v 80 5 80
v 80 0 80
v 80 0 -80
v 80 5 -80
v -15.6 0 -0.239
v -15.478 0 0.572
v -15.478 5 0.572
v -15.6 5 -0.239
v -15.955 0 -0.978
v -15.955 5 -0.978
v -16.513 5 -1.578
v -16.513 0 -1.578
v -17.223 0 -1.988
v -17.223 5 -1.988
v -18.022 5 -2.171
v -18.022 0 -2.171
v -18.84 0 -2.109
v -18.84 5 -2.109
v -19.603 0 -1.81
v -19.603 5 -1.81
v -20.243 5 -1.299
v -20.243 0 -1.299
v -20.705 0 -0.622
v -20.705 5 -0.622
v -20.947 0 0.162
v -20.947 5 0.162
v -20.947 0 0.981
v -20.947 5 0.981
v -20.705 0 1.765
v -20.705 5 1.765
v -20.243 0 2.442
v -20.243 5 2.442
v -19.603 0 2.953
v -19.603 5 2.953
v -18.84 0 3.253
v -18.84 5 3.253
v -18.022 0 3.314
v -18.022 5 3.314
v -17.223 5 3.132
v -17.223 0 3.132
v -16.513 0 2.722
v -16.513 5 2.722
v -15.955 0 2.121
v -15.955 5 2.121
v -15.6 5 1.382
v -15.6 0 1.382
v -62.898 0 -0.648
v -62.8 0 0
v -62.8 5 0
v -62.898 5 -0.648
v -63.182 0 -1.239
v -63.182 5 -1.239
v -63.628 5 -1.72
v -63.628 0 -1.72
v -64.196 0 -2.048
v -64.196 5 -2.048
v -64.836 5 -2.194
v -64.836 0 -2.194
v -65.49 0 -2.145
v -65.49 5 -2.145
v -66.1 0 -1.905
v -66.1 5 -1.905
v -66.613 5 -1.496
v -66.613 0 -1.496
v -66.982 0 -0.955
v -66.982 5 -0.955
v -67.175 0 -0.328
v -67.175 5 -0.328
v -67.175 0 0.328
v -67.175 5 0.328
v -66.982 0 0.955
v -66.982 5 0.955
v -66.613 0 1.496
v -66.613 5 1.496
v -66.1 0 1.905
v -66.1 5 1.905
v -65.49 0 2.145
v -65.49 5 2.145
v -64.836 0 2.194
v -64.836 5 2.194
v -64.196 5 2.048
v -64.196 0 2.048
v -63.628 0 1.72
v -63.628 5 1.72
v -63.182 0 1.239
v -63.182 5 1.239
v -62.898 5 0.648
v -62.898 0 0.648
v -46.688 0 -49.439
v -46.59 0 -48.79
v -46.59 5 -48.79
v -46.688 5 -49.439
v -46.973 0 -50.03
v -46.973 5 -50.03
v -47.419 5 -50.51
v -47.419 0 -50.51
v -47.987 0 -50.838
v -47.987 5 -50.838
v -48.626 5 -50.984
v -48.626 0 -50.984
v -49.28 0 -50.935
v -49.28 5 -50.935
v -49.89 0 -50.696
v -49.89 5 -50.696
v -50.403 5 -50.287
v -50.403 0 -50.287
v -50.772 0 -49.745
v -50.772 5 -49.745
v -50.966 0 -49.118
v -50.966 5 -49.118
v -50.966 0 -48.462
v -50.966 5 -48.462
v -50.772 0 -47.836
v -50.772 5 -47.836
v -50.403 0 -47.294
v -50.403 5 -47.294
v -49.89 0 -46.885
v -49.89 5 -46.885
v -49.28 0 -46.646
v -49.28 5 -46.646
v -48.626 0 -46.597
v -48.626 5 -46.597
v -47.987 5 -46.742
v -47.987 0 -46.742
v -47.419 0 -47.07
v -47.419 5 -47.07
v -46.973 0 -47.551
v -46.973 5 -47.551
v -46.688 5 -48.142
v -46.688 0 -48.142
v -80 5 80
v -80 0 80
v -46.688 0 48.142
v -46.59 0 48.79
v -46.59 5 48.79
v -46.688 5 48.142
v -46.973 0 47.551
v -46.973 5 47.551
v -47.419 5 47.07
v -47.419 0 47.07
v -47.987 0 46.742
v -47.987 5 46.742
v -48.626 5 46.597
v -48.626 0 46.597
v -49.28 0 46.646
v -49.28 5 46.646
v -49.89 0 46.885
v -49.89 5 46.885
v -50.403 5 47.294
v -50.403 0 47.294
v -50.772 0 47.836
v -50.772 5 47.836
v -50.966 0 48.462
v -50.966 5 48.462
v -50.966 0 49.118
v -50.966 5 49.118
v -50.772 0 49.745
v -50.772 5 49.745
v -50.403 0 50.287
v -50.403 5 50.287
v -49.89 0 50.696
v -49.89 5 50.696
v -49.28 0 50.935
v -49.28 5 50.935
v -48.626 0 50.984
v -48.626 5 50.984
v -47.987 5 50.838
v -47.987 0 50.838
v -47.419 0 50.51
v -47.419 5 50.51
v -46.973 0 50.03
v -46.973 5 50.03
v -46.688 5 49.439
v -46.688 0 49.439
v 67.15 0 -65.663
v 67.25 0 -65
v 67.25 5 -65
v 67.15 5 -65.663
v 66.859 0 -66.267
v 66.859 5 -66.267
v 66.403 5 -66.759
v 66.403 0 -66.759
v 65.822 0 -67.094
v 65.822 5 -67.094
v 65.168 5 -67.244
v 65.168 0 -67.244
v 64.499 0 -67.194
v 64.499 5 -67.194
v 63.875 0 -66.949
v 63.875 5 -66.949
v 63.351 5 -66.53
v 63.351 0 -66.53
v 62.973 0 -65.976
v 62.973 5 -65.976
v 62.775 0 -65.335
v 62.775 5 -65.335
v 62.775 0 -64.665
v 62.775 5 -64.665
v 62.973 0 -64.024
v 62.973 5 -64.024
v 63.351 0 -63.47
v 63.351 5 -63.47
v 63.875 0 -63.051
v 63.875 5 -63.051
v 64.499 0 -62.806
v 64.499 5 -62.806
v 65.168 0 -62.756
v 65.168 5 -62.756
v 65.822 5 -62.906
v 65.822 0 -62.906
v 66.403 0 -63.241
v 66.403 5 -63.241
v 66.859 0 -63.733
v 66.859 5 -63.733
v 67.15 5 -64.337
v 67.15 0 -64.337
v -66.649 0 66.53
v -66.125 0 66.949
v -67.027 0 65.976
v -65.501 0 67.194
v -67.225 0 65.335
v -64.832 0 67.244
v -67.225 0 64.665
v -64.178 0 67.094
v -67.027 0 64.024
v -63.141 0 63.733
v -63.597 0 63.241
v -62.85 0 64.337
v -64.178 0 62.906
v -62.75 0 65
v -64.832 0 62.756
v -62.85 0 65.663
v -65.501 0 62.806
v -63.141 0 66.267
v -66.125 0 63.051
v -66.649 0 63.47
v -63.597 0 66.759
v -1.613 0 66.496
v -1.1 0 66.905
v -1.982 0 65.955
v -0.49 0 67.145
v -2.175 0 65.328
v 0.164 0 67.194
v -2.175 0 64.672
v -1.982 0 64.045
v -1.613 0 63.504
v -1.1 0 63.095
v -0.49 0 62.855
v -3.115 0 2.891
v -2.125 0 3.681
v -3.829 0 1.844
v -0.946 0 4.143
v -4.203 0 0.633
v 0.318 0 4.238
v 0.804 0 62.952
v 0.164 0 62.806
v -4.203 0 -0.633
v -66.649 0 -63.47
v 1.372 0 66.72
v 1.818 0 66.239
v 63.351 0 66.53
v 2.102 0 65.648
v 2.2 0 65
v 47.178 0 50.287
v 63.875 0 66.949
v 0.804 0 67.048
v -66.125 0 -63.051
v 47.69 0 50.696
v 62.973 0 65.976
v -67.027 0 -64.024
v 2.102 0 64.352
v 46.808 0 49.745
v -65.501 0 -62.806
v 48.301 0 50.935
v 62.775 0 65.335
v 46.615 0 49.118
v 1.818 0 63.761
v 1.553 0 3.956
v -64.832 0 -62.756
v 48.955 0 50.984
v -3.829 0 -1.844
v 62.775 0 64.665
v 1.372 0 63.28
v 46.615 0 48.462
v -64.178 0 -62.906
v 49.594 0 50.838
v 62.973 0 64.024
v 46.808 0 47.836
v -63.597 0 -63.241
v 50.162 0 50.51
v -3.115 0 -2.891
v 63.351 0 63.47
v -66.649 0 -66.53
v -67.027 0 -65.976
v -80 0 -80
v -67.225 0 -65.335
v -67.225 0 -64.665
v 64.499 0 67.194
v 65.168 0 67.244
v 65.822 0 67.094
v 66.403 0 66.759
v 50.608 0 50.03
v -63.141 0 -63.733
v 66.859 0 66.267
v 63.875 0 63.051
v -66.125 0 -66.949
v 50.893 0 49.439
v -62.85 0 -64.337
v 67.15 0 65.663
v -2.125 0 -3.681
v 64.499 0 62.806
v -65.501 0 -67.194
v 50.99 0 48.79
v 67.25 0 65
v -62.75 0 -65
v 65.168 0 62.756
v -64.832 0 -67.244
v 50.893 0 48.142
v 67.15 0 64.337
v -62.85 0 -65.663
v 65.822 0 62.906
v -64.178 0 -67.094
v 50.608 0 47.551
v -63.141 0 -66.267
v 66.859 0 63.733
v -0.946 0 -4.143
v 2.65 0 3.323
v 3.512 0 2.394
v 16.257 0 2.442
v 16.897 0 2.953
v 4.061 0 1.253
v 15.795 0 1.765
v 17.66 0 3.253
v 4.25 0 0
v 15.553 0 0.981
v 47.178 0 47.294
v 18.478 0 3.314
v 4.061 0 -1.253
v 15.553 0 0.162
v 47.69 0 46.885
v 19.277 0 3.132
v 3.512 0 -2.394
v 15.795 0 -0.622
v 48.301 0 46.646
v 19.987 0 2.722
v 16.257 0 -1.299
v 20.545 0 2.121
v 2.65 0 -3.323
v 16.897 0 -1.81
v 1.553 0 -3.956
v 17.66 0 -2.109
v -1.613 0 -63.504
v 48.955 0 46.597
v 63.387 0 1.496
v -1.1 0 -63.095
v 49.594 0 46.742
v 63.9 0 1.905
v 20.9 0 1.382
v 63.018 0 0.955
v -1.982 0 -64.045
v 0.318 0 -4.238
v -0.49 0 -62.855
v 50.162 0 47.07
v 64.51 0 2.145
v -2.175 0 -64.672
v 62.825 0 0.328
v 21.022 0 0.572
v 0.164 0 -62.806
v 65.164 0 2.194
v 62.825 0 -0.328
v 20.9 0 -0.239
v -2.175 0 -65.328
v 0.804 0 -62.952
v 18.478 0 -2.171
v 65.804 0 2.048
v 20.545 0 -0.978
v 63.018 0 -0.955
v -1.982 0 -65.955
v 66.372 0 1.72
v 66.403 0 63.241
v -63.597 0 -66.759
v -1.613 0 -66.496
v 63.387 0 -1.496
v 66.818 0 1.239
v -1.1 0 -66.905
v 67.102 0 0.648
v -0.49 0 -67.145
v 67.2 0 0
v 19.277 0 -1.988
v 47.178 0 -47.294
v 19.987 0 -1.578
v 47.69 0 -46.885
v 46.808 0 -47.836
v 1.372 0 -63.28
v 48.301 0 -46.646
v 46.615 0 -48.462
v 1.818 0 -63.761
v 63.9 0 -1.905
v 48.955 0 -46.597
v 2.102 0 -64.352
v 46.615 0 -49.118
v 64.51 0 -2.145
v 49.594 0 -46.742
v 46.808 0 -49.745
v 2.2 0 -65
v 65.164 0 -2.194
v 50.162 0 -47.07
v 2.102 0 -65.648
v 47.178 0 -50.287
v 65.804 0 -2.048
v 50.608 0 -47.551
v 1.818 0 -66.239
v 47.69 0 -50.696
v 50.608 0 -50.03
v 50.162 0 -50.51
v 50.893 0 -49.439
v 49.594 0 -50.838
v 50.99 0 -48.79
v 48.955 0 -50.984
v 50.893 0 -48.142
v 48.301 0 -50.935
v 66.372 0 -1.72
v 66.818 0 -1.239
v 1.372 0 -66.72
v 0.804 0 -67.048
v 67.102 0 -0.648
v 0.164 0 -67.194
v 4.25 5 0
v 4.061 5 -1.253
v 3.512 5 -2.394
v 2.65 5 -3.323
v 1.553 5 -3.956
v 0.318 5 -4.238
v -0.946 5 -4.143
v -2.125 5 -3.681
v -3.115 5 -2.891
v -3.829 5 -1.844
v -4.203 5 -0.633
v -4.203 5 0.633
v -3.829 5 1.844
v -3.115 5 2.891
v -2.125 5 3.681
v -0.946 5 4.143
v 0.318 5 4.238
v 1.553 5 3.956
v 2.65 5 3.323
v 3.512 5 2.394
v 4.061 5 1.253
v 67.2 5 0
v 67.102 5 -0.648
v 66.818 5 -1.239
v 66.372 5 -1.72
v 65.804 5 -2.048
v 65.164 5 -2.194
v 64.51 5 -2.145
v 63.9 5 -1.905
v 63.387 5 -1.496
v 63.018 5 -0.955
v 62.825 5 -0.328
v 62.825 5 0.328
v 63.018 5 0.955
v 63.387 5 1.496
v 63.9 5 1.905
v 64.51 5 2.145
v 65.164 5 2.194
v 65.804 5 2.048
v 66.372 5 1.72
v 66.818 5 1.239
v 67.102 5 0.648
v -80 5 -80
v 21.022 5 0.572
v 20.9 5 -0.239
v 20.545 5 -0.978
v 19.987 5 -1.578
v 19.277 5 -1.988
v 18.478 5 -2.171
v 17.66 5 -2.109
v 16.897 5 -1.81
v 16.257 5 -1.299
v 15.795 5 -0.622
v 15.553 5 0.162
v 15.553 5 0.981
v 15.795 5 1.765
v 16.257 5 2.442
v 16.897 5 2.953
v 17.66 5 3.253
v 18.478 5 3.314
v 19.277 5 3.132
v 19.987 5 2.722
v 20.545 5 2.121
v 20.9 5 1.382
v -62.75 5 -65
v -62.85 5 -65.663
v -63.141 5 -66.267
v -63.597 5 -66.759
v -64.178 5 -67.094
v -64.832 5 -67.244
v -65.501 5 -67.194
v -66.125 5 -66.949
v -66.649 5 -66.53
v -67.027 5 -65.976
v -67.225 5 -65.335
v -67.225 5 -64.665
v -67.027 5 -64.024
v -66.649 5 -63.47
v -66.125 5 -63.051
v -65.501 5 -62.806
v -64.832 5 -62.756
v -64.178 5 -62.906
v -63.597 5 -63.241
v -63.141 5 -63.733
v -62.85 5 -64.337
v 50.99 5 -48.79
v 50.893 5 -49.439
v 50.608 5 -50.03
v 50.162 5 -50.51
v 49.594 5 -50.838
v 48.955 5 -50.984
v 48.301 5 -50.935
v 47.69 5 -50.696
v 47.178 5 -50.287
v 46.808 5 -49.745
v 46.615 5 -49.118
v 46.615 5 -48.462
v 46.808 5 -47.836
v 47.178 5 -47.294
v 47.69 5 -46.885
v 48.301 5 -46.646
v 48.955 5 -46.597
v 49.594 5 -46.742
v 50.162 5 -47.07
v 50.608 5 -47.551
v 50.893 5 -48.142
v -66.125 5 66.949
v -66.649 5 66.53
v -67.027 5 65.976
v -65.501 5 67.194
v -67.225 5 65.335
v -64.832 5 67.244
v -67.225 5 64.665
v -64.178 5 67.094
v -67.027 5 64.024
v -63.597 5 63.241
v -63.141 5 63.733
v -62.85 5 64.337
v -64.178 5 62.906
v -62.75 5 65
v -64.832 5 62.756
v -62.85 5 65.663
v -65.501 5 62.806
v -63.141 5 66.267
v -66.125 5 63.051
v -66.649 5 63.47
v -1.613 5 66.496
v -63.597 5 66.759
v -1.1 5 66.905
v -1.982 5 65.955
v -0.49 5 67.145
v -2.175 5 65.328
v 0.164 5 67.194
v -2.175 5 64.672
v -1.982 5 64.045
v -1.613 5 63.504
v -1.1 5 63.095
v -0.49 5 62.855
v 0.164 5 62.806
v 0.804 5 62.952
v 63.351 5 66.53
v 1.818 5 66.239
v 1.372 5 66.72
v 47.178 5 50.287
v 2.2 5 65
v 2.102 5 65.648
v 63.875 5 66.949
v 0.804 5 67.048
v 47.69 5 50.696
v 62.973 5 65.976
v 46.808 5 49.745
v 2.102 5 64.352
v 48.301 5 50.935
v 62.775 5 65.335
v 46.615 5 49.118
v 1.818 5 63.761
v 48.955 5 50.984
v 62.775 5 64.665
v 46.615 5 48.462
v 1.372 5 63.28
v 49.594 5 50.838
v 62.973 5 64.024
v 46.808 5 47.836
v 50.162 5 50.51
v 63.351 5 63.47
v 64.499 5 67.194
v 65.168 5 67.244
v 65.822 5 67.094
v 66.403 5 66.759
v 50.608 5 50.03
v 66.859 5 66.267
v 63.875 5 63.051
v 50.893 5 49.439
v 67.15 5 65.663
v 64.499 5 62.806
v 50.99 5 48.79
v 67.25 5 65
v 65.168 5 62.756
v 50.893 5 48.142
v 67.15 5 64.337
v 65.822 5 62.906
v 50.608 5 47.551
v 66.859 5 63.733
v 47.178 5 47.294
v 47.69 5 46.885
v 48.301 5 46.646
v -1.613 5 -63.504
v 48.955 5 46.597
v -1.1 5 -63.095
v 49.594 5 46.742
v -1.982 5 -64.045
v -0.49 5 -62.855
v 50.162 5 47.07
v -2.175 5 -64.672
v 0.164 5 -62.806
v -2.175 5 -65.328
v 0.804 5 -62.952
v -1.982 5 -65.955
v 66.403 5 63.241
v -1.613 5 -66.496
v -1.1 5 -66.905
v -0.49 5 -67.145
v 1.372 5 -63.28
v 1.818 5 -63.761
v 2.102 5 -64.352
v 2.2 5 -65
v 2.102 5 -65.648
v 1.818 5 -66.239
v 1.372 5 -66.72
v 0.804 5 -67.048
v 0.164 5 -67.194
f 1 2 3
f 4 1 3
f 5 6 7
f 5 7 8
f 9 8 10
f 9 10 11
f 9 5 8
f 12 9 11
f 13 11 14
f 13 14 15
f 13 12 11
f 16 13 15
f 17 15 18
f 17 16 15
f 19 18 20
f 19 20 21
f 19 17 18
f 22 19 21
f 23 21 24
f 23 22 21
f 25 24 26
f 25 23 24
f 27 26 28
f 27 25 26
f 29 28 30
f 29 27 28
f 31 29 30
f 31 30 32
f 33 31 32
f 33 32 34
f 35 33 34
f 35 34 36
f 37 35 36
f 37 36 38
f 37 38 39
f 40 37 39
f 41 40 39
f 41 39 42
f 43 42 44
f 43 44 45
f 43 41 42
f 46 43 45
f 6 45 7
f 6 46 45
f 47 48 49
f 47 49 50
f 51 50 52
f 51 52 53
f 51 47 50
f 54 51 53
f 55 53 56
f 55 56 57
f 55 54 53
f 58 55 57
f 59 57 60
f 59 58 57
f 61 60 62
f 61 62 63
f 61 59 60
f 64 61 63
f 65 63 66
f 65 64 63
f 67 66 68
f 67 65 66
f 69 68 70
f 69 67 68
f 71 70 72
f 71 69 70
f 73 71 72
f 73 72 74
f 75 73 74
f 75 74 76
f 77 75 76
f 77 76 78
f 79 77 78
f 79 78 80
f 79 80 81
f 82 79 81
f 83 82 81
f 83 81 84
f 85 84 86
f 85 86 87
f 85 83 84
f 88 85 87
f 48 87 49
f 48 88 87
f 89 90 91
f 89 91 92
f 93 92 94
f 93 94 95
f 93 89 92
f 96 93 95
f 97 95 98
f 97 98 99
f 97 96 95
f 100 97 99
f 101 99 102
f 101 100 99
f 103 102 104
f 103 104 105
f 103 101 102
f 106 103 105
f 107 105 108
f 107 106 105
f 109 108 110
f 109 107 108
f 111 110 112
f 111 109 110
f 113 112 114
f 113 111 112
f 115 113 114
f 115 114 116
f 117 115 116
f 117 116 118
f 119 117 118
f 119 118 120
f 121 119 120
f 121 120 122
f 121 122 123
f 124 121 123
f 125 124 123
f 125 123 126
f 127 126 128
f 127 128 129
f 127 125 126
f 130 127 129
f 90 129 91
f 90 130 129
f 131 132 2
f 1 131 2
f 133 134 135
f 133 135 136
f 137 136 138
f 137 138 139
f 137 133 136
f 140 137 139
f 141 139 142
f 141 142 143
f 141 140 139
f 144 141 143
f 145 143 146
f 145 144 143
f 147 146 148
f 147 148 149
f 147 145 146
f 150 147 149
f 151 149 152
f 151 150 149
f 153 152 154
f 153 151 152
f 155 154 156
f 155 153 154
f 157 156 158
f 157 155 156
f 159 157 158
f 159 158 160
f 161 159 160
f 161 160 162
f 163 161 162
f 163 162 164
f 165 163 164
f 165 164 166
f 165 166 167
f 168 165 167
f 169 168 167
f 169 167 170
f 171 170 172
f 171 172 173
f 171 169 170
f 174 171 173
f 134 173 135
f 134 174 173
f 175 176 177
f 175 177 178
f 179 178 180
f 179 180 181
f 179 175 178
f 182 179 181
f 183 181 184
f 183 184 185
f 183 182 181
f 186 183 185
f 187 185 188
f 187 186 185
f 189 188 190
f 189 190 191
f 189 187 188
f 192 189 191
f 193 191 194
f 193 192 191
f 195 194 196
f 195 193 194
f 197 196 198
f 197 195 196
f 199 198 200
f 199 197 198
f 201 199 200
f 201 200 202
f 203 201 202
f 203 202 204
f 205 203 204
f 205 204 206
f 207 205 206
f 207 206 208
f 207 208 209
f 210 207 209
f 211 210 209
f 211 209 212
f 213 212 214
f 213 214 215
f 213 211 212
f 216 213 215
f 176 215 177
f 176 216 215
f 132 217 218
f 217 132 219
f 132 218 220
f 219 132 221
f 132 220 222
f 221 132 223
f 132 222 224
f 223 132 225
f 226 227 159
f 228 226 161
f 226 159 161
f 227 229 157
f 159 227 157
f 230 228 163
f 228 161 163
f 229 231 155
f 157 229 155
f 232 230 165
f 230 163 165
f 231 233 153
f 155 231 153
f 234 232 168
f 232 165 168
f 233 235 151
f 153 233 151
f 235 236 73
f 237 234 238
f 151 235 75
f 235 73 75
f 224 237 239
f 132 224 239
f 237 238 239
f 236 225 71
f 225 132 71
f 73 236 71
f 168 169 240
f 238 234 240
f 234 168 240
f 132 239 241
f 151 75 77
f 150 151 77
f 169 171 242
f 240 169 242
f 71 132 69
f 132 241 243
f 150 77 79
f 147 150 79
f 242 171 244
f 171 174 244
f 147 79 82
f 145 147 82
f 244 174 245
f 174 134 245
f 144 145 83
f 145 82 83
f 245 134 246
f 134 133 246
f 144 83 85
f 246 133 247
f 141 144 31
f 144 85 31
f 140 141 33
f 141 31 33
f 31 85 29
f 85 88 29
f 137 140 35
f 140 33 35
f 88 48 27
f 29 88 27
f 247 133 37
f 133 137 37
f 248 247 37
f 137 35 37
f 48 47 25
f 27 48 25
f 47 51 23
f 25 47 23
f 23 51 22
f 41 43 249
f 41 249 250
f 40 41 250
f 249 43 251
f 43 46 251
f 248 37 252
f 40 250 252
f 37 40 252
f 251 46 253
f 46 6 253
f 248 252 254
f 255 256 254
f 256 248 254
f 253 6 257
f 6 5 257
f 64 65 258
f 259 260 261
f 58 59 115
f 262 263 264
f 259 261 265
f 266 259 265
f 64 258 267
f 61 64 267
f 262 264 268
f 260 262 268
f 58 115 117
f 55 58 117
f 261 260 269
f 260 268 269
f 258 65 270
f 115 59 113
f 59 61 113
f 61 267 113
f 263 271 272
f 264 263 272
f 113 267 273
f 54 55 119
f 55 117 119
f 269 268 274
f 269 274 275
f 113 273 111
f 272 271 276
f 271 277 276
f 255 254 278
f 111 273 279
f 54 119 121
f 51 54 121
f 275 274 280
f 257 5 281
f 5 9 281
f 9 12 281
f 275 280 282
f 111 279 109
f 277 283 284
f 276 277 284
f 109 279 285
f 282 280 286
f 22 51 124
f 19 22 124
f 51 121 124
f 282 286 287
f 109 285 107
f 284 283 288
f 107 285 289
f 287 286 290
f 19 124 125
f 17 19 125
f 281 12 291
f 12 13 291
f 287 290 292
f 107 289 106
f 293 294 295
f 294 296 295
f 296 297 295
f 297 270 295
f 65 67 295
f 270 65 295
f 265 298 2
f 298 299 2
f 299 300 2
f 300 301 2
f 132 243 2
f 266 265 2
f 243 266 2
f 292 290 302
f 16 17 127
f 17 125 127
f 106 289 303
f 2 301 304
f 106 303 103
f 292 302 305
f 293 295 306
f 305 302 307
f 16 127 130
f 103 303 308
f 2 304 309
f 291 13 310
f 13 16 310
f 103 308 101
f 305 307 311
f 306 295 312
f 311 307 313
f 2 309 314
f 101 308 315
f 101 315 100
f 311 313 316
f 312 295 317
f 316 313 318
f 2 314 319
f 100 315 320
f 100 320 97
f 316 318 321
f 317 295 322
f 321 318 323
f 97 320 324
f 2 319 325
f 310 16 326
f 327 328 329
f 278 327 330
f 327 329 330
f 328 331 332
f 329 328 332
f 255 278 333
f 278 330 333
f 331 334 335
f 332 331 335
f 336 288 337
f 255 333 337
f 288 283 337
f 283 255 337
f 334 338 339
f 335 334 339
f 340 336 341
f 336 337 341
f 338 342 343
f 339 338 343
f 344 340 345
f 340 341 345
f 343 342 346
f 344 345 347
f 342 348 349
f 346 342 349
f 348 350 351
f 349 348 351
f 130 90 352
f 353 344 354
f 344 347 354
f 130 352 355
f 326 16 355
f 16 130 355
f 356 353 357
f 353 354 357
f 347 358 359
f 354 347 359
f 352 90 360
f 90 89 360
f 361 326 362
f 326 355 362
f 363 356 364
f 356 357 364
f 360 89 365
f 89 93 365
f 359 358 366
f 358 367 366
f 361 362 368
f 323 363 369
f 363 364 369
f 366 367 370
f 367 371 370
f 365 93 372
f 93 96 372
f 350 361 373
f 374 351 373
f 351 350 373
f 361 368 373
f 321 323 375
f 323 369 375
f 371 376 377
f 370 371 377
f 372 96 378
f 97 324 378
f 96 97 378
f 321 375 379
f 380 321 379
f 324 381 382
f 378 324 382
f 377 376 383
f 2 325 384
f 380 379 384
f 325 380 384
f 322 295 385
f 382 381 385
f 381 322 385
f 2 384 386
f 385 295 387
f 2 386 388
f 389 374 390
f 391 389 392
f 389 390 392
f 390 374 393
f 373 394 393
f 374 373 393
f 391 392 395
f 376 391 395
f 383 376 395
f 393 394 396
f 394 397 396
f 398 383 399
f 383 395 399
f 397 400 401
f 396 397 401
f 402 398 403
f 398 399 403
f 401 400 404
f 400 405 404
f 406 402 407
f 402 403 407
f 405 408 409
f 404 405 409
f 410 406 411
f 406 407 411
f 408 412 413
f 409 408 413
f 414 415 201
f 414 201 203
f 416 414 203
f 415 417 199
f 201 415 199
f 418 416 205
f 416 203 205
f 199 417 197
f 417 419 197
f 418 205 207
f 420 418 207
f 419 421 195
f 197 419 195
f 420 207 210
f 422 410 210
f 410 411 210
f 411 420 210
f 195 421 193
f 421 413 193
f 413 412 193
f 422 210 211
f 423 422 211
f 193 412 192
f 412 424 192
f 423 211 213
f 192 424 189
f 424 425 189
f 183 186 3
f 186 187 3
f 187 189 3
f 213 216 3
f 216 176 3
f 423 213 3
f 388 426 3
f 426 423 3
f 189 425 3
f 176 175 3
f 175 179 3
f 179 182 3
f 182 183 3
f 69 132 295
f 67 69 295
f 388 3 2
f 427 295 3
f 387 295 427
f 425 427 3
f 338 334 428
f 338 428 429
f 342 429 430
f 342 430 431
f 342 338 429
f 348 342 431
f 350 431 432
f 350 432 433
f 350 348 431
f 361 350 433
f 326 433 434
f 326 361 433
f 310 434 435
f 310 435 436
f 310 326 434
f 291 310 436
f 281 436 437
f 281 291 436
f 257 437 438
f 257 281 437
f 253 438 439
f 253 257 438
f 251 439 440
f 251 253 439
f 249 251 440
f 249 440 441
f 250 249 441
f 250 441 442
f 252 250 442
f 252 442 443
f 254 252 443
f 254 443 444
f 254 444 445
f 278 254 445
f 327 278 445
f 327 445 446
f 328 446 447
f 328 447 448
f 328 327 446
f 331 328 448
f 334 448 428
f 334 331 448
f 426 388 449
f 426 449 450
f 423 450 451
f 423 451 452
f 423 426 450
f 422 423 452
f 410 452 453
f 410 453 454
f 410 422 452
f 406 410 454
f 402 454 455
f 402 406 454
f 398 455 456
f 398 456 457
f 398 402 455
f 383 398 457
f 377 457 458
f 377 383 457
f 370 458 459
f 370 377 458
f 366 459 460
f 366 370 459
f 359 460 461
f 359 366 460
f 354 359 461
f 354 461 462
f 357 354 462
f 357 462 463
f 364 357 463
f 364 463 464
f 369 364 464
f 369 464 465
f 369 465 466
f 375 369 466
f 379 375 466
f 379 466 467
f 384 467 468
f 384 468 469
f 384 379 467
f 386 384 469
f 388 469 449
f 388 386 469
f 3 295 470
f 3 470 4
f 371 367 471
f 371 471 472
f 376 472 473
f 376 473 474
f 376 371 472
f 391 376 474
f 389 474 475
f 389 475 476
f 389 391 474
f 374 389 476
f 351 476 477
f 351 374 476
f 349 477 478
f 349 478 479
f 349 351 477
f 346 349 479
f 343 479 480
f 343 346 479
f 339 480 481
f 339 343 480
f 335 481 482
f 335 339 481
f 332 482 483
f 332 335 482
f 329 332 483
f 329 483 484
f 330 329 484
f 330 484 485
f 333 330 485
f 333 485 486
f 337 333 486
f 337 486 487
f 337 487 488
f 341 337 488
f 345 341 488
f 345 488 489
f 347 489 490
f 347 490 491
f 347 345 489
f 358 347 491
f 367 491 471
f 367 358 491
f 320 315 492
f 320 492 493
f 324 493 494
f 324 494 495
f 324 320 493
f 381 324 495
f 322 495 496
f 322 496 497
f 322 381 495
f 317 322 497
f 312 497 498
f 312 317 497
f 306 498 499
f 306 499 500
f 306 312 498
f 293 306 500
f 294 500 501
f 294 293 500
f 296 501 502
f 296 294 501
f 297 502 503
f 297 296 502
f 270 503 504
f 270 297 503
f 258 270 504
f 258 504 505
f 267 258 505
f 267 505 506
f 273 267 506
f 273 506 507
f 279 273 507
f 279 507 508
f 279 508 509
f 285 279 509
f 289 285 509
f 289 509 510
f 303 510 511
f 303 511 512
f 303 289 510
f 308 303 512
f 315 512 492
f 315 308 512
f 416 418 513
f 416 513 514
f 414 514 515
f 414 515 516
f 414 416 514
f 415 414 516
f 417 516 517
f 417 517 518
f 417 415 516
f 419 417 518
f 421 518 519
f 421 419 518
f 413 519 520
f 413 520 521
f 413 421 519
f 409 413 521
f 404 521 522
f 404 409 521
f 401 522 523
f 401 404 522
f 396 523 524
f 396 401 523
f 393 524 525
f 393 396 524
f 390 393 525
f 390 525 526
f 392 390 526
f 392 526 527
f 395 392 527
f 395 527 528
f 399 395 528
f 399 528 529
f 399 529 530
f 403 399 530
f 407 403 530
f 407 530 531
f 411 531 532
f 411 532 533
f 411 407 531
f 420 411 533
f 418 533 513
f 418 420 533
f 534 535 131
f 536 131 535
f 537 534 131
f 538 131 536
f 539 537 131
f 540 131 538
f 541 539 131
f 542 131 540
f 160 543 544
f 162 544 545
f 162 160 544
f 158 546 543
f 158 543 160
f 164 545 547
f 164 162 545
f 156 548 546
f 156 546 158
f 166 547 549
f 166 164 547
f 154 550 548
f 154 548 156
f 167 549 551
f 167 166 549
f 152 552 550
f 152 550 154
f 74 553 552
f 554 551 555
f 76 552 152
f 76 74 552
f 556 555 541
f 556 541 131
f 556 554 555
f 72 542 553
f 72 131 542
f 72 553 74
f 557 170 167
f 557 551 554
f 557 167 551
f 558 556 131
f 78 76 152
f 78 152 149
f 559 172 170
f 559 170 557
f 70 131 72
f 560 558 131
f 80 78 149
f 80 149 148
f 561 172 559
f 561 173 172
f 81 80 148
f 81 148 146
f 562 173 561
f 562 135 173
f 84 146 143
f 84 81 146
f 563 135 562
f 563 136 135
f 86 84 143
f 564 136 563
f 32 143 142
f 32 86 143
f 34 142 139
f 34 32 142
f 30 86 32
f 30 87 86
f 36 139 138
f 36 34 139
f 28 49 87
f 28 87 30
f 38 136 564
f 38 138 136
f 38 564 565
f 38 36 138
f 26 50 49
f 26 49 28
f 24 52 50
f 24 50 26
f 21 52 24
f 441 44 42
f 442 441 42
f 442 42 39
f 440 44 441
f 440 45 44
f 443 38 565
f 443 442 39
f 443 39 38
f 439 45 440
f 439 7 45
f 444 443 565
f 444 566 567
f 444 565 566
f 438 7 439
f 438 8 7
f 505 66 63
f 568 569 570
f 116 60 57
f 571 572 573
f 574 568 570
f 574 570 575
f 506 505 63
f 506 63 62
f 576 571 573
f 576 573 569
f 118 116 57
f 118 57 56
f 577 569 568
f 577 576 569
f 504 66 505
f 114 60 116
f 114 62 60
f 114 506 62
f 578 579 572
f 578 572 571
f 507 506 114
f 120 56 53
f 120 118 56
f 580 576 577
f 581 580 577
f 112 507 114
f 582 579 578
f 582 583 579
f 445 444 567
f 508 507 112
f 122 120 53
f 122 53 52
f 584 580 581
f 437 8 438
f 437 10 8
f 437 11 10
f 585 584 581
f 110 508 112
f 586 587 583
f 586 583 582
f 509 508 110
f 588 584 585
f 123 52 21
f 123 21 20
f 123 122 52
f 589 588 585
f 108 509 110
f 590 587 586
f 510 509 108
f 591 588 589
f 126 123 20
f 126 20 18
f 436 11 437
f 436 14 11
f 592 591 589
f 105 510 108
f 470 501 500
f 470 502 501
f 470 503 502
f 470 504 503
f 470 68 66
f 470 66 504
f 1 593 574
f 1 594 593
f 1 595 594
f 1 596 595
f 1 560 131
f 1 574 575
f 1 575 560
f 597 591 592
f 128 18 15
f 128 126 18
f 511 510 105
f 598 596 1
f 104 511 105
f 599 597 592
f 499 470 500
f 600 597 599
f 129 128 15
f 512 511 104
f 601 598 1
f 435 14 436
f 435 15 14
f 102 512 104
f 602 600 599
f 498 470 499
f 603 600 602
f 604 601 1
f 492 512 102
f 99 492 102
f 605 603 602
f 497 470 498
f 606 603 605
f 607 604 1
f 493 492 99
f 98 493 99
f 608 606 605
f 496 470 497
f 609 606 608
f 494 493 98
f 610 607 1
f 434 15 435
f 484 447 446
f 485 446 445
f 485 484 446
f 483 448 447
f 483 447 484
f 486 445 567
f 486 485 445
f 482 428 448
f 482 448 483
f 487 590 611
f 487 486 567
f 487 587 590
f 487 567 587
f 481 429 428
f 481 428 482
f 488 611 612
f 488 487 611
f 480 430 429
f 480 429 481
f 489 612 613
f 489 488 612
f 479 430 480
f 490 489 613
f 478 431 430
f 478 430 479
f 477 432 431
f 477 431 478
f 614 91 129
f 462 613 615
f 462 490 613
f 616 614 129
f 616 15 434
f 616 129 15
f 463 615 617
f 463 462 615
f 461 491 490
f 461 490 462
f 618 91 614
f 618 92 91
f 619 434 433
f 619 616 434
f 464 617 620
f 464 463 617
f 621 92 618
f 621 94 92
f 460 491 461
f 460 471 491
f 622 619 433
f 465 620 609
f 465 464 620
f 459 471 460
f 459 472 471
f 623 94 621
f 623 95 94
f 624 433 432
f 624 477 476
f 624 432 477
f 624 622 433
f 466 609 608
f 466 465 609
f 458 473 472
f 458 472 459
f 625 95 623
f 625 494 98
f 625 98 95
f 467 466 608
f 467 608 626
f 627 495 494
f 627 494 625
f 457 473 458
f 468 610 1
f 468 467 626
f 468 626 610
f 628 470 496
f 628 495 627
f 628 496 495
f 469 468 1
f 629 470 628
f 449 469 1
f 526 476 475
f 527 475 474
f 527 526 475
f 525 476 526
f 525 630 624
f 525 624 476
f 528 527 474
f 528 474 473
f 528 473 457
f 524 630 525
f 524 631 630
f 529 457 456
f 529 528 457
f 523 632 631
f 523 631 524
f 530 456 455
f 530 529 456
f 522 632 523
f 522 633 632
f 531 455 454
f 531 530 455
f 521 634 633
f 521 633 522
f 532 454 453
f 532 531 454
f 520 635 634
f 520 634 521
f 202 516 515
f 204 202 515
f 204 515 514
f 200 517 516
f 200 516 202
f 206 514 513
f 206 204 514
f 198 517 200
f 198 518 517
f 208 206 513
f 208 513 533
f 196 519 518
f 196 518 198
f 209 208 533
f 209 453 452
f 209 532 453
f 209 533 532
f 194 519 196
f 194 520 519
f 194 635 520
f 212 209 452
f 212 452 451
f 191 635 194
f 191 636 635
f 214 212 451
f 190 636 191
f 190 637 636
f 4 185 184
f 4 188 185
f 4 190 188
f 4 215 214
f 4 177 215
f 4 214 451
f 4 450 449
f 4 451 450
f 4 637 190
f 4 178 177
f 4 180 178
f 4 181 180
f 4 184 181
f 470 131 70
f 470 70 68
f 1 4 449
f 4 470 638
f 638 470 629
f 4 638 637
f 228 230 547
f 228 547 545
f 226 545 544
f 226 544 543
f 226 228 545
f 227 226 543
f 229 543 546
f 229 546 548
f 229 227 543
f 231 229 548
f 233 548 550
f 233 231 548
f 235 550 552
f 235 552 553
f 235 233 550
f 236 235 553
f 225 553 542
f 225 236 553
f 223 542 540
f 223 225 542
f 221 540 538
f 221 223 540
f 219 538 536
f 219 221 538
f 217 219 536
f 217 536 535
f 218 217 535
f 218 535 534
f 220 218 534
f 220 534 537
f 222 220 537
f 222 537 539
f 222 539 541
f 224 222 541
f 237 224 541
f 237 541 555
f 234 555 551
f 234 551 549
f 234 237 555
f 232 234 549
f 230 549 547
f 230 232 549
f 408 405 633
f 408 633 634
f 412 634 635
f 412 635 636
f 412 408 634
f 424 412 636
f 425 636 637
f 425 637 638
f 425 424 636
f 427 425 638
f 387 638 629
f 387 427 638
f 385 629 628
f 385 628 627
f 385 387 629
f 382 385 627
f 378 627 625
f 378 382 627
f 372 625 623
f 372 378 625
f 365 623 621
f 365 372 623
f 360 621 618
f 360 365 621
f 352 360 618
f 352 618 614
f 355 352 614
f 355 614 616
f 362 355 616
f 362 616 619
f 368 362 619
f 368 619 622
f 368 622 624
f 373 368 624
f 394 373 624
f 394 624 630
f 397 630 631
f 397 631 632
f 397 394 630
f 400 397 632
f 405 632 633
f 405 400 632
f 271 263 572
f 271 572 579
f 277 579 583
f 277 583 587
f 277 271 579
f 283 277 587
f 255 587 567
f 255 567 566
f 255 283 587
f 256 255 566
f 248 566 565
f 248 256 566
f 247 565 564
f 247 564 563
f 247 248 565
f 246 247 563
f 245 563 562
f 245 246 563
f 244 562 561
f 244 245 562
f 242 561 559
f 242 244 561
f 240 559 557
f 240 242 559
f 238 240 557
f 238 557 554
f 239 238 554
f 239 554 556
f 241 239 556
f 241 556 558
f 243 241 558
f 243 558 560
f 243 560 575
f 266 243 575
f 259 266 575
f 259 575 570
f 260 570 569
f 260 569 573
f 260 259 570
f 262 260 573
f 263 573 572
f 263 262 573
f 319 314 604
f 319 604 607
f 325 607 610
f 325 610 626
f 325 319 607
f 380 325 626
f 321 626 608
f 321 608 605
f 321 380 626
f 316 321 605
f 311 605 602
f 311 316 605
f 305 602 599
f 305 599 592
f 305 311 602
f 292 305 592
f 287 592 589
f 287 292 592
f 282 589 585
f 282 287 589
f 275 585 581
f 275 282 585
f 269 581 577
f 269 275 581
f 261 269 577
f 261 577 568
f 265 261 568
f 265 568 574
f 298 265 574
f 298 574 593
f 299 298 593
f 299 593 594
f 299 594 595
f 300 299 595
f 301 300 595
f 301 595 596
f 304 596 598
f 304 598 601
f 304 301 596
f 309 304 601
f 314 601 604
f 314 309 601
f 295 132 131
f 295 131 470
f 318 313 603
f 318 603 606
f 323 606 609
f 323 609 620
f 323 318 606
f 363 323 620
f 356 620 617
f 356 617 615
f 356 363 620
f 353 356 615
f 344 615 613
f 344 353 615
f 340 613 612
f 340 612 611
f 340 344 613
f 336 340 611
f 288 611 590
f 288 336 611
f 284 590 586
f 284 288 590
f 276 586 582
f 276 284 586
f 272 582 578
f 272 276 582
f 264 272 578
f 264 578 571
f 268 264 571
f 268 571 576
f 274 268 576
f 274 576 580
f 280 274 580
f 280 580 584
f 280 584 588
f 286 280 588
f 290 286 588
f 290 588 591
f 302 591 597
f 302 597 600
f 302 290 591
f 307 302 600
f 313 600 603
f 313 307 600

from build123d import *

# Parameters (mm, degrees)
SKETCH1_W           = 160
SKETCH1_H           = 160
SKETCH1_R           = 2.2
SKETCH1_R_2         = 4.25
SKETCH1_R_3         = 2.75
SKETCH1_R_4         = 2.25
BOSS_EXTRUDE1_DEPTH = 5


with BuildPart() as part:
    # Sketch1 → Boss-Extrude1 (new body)
    with BuildSketch(Plane(origin=(0, 0, 0), x_dir=(1, 0, 0), z_dir=(0, 1, 0))):
        Rectangle(SKETCH1_W, SKETCH1_H)
        with Locations((48.790367902, 48.790367902)):
            Circle(SKETCH1_R, mode=Mode.SUBTRACT)
        with Locations((48.790367902, -48.790367902)):
            Circle(SKETCH1_R, mode=Mode.SUBTRACT)
        with Locations((-48.790367902, -48.790367902)):
            Circle(SKETCH1_R, mode=Mode.SUBTRACT)
        with Locations((-48.790367902, 48.790367902)):
            Circle(SKETCH1_R, mode=Mode.SUBTRACT)
        Circle(SKETCH1_R_2, mode=Mode.SUBTRACT)
        with Locations((18.272421355, -0.571625498)):
            Circle(SKETCH1_R_3, mode=Mode.SUBTRACT)
        with Locations((-18.227578645, -0.571625498)):
            Circle(SKETCH1_R_3, mode=Mode.SUBTRACT)
        with Locations((0, 65)):
            Circle(SKETCH1_R, mode=Mode.SUBTRACT)
        with Locations((65, 0)):
            Circle(SKETCH1_R, mode=Mode.SUBTRACT)
        with Locations((0, -65)):
            Circle(SKETCH1_R, mode=Mode.SUBTRACT)
        with Locations((-65, 0)):
            Circle(SKETCH1_R, mode=Mode.SUBTRACT)
        with Locations((-65, 65)):
            Circle(SKETCH1_R_4, mode=Mode.SUBTRACT)
        with Locations((65, 65)):
            Circle(SKETCH1_R_4, mode=Mode.SUBTRACT)
        with Locations((65, -65)):
            Circle(SKETCH1_R_4, mode=Mode.SUBTRACT)
        with Locations((-65, -65)):
            Circle(SKETCH1_R_4, mode=Mode.SUBTRACT)
    extrude(amount=BOSS_EXTRUDE1_DEPTH)


solid = part.part
